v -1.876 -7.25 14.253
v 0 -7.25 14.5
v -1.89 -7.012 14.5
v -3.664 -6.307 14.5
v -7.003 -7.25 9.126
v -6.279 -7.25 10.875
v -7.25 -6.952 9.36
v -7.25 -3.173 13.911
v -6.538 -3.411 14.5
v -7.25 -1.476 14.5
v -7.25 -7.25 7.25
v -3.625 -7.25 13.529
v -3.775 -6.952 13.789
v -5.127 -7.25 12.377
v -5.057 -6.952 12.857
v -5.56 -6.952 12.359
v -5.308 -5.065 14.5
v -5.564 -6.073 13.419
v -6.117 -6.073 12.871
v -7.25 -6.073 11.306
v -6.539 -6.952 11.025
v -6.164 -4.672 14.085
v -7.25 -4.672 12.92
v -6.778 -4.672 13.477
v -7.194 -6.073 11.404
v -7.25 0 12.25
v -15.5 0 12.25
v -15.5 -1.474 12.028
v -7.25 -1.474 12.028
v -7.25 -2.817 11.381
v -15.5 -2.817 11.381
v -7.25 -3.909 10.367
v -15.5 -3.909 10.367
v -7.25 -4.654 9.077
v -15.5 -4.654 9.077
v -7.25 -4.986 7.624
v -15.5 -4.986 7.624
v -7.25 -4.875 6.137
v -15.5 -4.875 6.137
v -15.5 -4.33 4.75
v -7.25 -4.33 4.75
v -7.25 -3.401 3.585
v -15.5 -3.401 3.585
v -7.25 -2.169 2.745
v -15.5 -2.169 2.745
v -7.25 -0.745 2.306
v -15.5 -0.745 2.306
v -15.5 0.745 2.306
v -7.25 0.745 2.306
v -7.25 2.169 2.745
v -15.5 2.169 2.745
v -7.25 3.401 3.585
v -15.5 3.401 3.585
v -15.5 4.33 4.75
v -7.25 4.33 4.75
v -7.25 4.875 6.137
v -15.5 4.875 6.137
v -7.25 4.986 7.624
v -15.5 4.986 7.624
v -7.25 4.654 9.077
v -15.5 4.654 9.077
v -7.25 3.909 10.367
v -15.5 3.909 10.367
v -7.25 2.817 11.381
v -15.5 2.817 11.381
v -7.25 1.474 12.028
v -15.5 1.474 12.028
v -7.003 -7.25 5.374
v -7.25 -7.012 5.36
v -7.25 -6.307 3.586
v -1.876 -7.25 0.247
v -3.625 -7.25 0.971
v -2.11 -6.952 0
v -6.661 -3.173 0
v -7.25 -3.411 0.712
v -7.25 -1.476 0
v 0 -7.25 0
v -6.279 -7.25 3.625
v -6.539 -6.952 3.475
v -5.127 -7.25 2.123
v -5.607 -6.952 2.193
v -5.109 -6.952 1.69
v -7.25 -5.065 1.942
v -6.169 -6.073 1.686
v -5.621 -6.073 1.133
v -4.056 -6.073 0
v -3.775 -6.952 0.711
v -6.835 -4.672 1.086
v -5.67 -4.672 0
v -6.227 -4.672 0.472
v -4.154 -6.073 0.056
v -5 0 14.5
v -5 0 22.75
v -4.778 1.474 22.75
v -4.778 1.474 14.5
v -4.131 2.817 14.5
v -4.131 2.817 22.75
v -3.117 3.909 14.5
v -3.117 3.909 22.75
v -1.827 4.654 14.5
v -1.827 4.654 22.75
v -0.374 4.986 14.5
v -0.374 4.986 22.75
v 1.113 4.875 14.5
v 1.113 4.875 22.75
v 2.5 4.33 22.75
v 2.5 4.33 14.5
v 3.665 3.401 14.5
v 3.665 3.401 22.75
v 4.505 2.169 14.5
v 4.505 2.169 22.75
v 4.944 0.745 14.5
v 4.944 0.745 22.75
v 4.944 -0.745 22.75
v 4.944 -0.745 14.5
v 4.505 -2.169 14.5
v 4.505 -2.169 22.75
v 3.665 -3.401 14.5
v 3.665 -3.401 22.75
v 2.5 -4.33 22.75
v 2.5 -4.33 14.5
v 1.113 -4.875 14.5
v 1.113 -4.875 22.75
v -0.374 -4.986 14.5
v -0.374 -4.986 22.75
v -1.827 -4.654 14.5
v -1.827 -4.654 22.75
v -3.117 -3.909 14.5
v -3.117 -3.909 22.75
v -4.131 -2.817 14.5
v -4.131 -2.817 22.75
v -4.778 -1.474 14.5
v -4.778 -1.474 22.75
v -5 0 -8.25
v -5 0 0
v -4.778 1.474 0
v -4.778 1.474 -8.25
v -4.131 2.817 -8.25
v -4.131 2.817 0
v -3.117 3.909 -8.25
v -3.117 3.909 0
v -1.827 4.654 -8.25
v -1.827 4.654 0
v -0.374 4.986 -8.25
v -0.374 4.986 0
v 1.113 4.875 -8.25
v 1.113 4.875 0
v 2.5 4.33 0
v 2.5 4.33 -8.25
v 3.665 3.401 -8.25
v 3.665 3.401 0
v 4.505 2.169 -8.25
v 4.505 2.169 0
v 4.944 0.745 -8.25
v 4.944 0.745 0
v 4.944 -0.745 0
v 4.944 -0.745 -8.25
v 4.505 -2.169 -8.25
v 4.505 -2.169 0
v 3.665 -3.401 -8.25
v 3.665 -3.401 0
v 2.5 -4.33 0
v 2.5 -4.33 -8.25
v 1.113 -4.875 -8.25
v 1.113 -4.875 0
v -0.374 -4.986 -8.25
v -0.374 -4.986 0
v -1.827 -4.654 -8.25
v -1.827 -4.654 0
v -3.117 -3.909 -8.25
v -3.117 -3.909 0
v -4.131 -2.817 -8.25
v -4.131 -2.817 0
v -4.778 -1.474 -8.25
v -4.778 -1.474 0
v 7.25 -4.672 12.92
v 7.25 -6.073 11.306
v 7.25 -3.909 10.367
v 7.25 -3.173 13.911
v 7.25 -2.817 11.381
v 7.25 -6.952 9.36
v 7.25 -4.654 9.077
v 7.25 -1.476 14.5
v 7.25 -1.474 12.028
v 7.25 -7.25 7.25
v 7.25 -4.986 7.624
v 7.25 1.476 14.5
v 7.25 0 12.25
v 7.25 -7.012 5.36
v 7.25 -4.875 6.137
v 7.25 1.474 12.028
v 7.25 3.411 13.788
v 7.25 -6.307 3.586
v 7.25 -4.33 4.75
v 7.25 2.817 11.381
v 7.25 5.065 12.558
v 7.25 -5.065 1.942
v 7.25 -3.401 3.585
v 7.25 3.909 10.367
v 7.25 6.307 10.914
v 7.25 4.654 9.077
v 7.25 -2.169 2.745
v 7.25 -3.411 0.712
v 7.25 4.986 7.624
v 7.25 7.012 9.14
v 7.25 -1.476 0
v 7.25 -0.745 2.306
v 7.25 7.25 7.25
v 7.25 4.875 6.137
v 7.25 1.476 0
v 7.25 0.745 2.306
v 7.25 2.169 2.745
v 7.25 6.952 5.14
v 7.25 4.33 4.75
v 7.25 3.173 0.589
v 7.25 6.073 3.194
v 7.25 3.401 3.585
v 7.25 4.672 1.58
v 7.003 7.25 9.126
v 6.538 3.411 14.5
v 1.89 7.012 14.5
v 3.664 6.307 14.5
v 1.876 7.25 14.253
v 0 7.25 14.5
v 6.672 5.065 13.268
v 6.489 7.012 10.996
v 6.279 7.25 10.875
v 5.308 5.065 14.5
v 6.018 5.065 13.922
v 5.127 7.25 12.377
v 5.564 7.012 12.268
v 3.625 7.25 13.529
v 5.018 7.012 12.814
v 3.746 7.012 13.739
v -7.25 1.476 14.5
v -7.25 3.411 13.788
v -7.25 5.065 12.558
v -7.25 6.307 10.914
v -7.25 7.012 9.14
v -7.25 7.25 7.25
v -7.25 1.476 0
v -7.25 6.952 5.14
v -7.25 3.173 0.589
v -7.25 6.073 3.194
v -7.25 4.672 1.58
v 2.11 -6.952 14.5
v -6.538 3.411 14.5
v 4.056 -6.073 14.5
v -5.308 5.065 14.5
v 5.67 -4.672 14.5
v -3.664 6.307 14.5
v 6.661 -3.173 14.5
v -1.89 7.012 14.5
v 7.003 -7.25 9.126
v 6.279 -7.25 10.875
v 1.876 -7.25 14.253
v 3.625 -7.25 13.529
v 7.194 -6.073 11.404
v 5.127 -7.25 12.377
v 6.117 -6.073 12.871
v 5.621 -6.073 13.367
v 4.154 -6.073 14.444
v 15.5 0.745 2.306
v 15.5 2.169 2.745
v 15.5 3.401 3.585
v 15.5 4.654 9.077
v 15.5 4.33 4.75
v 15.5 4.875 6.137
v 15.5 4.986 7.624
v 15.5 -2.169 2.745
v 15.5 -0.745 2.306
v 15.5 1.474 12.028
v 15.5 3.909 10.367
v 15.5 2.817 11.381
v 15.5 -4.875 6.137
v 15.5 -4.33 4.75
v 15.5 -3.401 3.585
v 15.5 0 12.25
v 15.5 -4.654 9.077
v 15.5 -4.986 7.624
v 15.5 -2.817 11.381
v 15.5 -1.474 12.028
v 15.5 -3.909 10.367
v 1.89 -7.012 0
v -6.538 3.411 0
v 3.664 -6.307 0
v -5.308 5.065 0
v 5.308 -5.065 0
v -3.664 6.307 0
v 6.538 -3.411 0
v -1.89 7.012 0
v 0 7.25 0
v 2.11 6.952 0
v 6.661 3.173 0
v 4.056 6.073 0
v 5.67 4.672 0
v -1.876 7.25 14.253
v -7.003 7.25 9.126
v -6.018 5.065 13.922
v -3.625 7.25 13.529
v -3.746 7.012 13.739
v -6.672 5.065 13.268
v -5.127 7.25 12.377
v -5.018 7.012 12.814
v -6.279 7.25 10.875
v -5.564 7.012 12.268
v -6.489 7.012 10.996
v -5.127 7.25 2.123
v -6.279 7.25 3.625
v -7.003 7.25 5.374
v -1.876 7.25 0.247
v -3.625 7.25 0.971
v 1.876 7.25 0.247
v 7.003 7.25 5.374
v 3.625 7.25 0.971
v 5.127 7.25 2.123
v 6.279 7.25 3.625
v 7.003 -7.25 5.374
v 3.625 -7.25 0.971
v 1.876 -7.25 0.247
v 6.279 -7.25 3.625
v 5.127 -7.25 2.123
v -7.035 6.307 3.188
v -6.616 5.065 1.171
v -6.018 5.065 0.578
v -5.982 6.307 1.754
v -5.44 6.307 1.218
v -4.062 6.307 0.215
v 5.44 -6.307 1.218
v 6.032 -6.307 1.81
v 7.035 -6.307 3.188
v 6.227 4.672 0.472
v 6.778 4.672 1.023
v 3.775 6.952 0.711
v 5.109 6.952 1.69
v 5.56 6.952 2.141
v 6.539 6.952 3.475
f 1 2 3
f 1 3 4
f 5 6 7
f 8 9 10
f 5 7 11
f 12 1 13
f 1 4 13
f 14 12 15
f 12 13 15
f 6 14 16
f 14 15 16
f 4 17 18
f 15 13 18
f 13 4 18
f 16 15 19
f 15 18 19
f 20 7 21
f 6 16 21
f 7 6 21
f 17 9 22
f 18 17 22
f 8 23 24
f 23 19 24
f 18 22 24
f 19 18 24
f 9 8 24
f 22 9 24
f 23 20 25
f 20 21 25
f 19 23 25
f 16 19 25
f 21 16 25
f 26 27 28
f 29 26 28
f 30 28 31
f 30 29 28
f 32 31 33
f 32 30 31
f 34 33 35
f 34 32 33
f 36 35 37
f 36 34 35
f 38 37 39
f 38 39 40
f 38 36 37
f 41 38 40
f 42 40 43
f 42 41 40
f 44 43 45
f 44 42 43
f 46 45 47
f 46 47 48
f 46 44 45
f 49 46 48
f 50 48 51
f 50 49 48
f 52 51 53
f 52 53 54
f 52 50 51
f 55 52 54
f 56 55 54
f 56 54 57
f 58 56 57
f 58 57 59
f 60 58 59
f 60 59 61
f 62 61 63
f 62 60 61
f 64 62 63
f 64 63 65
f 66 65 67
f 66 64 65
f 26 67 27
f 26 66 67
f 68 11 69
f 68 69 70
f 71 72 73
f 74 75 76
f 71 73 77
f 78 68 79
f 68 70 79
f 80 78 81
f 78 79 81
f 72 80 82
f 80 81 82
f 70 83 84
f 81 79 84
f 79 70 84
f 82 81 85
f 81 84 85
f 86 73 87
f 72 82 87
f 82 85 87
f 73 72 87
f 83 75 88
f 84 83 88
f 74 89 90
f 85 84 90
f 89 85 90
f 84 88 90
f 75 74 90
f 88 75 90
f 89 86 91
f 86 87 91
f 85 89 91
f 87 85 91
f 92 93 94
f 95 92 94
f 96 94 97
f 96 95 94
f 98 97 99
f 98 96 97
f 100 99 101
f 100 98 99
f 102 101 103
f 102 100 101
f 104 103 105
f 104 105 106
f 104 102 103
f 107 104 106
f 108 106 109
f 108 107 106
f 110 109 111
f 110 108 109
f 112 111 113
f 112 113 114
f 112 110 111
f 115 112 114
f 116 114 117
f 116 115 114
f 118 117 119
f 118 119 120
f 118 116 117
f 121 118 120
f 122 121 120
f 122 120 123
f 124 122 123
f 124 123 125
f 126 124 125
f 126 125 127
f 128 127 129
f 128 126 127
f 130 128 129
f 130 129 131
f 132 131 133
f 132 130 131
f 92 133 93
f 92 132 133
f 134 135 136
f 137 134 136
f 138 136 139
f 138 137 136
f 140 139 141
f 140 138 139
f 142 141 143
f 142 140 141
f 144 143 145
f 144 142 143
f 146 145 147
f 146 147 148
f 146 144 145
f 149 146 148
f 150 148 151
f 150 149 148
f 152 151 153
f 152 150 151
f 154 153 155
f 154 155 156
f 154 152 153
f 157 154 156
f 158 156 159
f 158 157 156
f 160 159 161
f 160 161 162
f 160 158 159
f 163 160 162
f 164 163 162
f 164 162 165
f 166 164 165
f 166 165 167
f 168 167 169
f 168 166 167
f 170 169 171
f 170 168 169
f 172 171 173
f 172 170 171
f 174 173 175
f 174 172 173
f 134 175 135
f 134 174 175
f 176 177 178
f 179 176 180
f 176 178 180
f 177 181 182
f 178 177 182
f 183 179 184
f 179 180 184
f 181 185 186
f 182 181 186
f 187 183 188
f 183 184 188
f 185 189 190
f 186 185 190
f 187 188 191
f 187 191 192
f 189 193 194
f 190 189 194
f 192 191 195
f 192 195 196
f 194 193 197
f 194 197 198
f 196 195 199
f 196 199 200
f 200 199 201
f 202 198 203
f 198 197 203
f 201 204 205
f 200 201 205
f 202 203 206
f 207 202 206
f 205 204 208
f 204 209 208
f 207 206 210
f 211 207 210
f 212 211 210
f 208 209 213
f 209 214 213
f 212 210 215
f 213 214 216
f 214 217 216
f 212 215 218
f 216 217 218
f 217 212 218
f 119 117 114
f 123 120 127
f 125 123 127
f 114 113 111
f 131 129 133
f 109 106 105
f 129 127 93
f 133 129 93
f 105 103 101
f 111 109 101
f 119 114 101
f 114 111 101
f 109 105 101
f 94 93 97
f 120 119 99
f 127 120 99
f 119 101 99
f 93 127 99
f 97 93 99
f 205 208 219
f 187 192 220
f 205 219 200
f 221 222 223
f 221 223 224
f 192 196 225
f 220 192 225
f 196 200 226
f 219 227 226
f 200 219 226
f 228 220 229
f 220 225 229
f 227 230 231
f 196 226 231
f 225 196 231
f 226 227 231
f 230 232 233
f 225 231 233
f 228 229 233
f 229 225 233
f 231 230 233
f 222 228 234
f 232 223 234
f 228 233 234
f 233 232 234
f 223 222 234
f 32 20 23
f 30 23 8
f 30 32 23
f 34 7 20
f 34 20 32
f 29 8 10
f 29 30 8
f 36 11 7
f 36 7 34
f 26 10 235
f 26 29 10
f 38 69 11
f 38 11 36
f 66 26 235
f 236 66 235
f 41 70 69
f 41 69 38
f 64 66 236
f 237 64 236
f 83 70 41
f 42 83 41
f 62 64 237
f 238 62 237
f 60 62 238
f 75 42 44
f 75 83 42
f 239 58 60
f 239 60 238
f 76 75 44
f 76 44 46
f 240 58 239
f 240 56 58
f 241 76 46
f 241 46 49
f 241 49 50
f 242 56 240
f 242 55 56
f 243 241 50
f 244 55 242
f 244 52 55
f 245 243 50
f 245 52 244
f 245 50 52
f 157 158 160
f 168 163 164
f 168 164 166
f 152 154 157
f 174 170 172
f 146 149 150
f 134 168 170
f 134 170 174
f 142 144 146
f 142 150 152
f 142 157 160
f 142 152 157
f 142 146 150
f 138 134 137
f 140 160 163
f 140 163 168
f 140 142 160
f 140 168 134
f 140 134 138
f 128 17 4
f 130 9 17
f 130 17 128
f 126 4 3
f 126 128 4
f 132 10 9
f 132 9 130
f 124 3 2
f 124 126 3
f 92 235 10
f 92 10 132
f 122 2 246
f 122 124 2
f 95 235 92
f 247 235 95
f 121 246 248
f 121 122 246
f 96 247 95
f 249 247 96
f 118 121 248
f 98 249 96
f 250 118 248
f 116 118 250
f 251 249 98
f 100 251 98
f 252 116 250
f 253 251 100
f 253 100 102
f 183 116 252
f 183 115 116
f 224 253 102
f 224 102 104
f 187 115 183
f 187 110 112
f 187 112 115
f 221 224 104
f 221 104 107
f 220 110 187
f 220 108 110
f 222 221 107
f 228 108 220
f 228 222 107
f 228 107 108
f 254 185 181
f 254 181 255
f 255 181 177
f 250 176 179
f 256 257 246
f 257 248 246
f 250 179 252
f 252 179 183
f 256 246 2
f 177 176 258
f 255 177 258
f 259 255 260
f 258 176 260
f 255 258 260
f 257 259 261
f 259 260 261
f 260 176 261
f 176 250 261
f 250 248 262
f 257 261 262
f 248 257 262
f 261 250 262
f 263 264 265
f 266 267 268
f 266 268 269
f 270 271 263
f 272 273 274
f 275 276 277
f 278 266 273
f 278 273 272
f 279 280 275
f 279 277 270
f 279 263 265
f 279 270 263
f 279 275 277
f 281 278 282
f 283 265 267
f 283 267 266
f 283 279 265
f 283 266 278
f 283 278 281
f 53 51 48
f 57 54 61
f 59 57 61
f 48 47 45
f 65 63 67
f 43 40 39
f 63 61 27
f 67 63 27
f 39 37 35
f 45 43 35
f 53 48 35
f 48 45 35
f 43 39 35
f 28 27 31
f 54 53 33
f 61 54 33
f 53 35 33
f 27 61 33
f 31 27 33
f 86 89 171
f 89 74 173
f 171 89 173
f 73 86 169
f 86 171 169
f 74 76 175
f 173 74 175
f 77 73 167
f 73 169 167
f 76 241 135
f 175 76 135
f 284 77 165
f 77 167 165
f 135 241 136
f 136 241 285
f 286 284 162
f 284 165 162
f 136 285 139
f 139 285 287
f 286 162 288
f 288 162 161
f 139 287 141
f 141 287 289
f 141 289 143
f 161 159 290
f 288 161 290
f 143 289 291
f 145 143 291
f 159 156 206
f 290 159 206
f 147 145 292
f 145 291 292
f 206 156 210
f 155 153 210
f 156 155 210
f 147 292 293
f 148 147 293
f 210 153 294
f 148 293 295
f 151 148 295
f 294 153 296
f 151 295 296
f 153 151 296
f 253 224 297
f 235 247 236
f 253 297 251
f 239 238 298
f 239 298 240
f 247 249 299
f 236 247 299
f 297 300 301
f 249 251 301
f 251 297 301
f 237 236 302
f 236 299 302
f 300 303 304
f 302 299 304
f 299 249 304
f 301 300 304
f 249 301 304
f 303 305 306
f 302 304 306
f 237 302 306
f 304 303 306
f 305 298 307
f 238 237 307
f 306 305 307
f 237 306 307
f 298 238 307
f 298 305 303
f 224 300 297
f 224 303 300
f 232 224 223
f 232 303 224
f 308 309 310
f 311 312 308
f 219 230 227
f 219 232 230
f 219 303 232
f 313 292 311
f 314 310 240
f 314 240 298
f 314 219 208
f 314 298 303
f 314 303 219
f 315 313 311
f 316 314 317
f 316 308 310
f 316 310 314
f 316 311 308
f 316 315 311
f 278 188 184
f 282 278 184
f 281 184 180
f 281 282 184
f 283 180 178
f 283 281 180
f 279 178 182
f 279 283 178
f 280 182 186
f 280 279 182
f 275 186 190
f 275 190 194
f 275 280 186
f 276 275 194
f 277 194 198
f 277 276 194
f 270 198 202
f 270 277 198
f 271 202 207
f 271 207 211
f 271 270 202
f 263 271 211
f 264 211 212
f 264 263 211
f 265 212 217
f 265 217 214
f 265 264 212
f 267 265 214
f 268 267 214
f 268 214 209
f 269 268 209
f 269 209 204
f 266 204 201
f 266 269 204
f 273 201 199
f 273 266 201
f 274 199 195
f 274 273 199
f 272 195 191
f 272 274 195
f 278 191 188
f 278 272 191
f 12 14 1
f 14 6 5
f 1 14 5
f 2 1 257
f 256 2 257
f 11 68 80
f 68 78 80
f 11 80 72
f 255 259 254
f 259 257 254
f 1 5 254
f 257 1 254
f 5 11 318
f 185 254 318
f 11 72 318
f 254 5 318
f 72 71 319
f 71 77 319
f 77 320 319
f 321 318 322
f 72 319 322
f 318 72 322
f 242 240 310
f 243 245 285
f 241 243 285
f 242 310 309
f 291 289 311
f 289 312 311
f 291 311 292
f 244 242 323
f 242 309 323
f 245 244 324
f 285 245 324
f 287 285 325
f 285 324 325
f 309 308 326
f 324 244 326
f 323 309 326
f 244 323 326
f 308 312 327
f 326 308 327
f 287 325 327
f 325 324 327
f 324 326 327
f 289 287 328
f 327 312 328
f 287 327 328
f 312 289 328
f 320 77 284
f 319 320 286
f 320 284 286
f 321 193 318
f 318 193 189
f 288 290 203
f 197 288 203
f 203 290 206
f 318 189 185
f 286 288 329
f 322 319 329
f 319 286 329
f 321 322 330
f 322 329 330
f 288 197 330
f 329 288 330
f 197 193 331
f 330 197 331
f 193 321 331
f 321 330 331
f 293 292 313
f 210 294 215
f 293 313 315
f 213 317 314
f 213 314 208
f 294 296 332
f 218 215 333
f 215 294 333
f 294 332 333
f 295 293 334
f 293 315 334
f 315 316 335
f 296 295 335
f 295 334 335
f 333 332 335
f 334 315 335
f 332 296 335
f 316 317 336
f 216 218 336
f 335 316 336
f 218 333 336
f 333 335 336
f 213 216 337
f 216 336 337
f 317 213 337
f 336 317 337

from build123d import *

# Parameters (mm, degrees)
SKETCH1_W           = 14.5
SKETCH1_H           = 14.5
BOSS_EXTRUDE1_DEPTH = 14.5
SKETCH6_R           = 5
BOSS_EXTRUDE2_DEPTH = 15.5
SKETCH7_R           = 5
BOSS_EXTRUDE3_DEPTH = 15.5


with BuildPart() as part:
    # Sketch1 → Boss-Extrude1 (new body)
    with BuildSketch(Plane.XY):
        Rectangle(SKETCH1_W, SKETCH1_H)
    extrude(amount=BOSS_EXTRUDE1_DEPTH)

    # Sketch5 → Cut-Revolve1 (revolve, cut)
    with BuildSketch(Plane(origin=(3.625, 0, 3.625), x_dir=(-0.7071067811865477, 0, 0.7071067811865475), z_dir=(-0.7071067811865475, 0, -0.7071067811865477))):
        with BuildLine():
            Line((12.376524164, 7.25), (16.846797481, 7.25))
            Line((16.846797481, 7.25), (16.846797481, -7.25))
            Line((16.846797481, -7.25), (12.376524164, -7.25))
            ThreePointArc((12.376524164, -7.25), (15.489035507, 0), (12.376524164, 7.25))
        make_face()
    revolve(axis=Axis((0, 7.25, 7.25), (0, -1, 0)), mode=Mode.SUBTRACT)

    # Sketch6 → Boss-Extrude2 (add, symmetric)
    with BuildSketch(Plane(origin=(0, 0, 0), x_dir=(0, 0, -1), z_dir=(1, 0, 0))):
        with Locations(Location((-7.25, 0, 0), (0, 0, 180))):
            Circle(SKETCH6_R)
    extrude(amount=BOSS_EXTRUDE2_DEPTH, both=True)

    # Sketch7 → Boss-Extrude3 (add, symmetric)
    with BuildSketch(Plane(origin=(0, 0, 7.25), x_dir=(-1, 0, 0), z_dir=(0, 0, -1))):
        Circle(SKETCH7_R)
    extrude(amount=BOSS_EXTRUDE3_DEPTH, both=True)


solid = part.part
